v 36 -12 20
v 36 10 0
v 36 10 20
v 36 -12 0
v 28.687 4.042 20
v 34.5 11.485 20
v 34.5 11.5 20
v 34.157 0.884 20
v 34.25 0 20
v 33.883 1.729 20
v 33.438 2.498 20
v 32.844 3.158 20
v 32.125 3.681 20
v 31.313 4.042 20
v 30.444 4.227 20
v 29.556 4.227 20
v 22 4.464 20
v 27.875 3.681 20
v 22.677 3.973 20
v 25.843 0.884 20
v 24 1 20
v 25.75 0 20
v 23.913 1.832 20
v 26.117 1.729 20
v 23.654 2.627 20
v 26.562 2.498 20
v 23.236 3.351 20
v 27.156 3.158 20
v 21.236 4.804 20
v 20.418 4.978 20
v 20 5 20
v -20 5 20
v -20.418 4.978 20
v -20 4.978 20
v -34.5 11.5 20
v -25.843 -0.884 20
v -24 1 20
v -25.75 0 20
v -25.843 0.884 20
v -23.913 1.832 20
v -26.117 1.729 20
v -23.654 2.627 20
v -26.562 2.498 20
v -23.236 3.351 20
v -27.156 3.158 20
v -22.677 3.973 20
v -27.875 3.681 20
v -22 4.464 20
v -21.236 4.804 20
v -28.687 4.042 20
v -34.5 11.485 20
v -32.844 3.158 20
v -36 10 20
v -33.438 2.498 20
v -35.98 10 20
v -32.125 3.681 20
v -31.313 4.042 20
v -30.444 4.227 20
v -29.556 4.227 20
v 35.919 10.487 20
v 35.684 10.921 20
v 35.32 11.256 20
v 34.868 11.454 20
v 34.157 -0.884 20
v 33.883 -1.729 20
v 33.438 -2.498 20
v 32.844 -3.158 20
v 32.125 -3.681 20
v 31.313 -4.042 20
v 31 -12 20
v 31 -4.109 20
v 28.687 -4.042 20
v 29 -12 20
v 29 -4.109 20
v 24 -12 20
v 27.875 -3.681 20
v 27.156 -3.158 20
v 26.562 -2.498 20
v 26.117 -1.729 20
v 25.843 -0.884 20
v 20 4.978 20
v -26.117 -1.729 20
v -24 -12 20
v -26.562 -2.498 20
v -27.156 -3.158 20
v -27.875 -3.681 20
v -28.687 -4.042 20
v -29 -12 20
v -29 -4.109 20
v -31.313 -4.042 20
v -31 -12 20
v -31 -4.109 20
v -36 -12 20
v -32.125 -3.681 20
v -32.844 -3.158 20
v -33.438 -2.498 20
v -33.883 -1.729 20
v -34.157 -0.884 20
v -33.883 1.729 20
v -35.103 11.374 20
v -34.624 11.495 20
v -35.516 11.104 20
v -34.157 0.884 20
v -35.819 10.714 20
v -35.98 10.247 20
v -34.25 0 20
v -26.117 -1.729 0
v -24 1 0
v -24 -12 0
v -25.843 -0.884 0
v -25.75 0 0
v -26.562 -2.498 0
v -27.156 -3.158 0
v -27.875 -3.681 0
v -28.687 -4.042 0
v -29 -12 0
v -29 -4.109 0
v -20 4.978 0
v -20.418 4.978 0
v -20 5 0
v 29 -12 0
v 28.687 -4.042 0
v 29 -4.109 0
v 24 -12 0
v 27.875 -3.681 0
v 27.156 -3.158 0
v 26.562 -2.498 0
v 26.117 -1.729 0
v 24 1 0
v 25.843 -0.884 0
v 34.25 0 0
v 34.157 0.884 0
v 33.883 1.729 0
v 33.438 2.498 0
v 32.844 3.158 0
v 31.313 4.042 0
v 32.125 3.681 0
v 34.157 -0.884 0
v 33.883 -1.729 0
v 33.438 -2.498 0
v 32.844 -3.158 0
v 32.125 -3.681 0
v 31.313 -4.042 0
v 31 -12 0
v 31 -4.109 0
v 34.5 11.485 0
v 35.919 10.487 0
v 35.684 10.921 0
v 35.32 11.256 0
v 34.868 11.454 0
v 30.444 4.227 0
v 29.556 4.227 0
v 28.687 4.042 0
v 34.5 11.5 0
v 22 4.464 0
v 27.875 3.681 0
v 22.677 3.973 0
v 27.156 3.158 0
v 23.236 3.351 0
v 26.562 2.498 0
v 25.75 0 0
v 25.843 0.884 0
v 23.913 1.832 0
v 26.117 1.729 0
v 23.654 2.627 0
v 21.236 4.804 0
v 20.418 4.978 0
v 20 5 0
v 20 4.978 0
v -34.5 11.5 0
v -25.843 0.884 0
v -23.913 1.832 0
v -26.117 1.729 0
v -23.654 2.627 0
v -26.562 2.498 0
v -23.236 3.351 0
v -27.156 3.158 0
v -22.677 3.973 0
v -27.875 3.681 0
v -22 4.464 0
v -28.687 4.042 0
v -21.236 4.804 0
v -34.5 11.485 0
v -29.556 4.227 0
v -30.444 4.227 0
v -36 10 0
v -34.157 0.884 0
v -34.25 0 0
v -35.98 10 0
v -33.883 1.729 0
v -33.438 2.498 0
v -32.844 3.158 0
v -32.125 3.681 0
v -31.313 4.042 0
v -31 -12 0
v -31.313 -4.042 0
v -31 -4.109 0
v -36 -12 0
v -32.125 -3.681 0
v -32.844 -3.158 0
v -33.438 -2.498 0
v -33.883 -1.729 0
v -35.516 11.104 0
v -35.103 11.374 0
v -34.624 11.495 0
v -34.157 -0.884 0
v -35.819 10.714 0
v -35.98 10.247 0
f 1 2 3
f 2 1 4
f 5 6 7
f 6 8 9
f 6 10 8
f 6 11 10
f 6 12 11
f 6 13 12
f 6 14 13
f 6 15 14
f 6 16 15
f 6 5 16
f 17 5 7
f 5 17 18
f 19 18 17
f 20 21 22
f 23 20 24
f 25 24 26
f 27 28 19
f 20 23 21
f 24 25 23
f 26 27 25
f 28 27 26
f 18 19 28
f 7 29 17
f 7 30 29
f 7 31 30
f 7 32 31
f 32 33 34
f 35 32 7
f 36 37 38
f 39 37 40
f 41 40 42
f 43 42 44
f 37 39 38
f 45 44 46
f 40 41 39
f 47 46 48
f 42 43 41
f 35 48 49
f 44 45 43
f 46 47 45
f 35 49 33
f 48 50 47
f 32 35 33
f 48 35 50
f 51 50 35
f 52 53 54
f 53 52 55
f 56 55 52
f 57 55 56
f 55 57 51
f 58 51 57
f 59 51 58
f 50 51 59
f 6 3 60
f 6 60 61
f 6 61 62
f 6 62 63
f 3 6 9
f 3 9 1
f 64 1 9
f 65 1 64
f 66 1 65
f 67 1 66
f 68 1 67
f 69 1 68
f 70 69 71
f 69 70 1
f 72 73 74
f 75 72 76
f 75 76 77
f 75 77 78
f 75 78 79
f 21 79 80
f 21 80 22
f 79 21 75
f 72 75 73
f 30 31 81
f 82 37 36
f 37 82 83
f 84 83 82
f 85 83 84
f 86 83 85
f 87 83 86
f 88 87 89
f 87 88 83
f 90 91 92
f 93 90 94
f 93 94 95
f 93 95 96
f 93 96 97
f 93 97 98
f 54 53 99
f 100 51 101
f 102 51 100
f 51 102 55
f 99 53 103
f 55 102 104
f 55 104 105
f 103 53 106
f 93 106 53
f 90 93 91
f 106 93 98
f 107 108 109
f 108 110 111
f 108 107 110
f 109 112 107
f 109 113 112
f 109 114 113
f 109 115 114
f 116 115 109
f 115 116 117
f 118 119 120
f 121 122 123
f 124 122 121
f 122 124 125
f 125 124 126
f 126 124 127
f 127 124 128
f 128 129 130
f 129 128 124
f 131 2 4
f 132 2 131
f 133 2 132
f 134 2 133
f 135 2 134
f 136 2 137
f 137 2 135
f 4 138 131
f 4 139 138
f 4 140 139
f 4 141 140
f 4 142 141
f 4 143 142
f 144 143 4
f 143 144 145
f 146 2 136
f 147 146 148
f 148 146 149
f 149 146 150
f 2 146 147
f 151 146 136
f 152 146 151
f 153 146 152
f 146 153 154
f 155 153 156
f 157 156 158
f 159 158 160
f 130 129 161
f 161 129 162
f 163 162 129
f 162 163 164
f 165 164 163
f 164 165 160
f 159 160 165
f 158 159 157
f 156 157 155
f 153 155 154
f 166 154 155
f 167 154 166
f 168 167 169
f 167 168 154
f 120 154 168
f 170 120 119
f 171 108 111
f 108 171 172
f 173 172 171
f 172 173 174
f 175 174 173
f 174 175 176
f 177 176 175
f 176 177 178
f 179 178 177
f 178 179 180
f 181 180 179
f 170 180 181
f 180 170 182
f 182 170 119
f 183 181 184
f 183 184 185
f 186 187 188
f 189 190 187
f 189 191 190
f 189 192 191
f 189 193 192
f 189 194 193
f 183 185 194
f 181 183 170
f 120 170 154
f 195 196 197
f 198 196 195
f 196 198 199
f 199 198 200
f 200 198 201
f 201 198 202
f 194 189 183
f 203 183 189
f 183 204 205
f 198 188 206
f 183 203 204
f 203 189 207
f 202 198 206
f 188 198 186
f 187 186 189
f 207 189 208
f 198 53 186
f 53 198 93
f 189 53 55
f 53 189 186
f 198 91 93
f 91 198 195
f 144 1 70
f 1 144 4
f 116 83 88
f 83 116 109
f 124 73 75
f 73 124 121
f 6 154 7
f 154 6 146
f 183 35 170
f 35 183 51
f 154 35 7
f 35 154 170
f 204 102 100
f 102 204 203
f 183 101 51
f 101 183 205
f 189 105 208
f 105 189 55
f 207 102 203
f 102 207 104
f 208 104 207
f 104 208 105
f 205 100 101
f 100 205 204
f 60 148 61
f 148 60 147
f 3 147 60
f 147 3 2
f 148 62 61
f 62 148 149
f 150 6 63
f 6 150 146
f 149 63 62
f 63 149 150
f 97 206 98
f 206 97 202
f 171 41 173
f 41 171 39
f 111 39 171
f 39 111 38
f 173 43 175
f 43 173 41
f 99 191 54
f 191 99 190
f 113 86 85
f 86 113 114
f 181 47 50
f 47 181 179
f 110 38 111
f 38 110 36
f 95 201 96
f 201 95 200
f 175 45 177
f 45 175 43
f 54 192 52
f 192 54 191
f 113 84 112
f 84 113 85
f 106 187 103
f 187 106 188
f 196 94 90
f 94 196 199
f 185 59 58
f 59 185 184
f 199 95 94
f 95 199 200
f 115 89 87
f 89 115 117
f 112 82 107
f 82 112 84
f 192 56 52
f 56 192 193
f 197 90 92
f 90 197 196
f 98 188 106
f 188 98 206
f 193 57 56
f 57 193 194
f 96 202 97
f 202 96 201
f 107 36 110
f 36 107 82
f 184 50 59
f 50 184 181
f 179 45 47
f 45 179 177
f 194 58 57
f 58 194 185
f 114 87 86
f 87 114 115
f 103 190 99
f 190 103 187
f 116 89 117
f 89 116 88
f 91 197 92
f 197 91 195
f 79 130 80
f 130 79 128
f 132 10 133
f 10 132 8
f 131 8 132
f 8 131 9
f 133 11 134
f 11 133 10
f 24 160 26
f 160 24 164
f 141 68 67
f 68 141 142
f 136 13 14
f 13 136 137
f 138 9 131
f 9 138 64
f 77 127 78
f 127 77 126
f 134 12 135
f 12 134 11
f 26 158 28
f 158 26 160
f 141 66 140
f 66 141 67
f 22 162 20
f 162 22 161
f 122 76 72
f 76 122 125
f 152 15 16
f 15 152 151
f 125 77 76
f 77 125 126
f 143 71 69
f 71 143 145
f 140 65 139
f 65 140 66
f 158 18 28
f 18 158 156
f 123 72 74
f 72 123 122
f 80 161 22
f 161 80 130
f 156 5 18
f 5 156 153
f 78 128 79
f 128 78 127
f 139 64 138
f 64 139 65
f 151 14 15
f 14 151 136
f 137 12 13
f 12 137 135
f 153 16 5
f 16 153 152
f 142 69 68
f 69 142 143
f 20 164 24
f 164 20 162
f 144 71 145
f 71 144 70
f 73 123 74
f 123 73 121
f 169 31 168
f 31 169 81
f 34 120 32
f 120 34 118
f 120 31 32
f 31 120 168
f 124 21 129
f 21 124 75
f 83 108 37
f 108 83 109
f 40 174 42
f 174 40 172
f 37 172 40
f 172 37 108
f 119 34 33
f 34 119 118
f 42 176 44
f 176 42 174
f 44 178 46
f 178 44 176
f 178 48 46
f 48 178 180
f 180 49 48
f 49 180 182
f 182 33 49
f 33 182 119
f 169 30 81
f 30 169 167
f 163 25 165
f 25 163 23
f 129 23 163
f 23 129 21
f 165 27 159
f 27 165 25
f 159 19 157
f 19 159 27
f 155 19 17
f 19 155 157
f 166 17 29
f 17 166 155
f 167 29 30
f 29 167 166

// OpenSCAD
$fa = 12;
$fs = 0.5;

w = 60; // Smooth rod distance (center to center)

module screws() {
  for (x = [-w/2, w/2]) {
    translate([x, 0, 0]) {
      // Push-through M3 screw hole.
      translate([0, -6, 0]) rotate([0, 90, 0])
	cylinder(r=1.65, h=20, center=true, $fn=24);
      // M3 nut holder.
      translate([-x/5, -6, 0])
	rotate([0, 0, 0]) rotate([0, 90, 0])
	cylinder(r=3.3, h=2.3, center=true, $fn=6);
    }
  }
}

module bracket(h) {
  difference() {
    union() {
      translate([0, -1, 0]) cube([w+12, 22, h], center=true);
      // Sandwich mount.
      translate([0, 10.5, 0]) cube([w+9, 2, h], center=true);
      translate([-w/2-4.5, 10, 0]) cylinder(r=1.5, h=h, center=true);
      translate([w/2+4.5, 10, 0]) cylinder(r=1.5, h=h, center=true);
    }
    // Smooth rod mounting slots.
    for (x = [-w/2, w/2]) {
      translate([x, 0, 0]) {
	cylinder(r=4.25, h=h+1, center=true);
	translate([0, -10, 0]) cube([2, 20, h+1], center=true);
      }
    }
    // Belt path.
    translate([0, -5, 0]) cube([w-20, 20, h+1], center=true);
    translate([0, -9, 0]) cube([w-12, 20, h+1], center=true);
    translate([-w/2+10, 1, 0]) cylinder(r=4, h=h+1, center=true);
    translate([w/2-10, 1, 0]) cylinder(r=4, h=h+1, center=true);
  }
}

translate([0, 0, 10]) bracket(20);
